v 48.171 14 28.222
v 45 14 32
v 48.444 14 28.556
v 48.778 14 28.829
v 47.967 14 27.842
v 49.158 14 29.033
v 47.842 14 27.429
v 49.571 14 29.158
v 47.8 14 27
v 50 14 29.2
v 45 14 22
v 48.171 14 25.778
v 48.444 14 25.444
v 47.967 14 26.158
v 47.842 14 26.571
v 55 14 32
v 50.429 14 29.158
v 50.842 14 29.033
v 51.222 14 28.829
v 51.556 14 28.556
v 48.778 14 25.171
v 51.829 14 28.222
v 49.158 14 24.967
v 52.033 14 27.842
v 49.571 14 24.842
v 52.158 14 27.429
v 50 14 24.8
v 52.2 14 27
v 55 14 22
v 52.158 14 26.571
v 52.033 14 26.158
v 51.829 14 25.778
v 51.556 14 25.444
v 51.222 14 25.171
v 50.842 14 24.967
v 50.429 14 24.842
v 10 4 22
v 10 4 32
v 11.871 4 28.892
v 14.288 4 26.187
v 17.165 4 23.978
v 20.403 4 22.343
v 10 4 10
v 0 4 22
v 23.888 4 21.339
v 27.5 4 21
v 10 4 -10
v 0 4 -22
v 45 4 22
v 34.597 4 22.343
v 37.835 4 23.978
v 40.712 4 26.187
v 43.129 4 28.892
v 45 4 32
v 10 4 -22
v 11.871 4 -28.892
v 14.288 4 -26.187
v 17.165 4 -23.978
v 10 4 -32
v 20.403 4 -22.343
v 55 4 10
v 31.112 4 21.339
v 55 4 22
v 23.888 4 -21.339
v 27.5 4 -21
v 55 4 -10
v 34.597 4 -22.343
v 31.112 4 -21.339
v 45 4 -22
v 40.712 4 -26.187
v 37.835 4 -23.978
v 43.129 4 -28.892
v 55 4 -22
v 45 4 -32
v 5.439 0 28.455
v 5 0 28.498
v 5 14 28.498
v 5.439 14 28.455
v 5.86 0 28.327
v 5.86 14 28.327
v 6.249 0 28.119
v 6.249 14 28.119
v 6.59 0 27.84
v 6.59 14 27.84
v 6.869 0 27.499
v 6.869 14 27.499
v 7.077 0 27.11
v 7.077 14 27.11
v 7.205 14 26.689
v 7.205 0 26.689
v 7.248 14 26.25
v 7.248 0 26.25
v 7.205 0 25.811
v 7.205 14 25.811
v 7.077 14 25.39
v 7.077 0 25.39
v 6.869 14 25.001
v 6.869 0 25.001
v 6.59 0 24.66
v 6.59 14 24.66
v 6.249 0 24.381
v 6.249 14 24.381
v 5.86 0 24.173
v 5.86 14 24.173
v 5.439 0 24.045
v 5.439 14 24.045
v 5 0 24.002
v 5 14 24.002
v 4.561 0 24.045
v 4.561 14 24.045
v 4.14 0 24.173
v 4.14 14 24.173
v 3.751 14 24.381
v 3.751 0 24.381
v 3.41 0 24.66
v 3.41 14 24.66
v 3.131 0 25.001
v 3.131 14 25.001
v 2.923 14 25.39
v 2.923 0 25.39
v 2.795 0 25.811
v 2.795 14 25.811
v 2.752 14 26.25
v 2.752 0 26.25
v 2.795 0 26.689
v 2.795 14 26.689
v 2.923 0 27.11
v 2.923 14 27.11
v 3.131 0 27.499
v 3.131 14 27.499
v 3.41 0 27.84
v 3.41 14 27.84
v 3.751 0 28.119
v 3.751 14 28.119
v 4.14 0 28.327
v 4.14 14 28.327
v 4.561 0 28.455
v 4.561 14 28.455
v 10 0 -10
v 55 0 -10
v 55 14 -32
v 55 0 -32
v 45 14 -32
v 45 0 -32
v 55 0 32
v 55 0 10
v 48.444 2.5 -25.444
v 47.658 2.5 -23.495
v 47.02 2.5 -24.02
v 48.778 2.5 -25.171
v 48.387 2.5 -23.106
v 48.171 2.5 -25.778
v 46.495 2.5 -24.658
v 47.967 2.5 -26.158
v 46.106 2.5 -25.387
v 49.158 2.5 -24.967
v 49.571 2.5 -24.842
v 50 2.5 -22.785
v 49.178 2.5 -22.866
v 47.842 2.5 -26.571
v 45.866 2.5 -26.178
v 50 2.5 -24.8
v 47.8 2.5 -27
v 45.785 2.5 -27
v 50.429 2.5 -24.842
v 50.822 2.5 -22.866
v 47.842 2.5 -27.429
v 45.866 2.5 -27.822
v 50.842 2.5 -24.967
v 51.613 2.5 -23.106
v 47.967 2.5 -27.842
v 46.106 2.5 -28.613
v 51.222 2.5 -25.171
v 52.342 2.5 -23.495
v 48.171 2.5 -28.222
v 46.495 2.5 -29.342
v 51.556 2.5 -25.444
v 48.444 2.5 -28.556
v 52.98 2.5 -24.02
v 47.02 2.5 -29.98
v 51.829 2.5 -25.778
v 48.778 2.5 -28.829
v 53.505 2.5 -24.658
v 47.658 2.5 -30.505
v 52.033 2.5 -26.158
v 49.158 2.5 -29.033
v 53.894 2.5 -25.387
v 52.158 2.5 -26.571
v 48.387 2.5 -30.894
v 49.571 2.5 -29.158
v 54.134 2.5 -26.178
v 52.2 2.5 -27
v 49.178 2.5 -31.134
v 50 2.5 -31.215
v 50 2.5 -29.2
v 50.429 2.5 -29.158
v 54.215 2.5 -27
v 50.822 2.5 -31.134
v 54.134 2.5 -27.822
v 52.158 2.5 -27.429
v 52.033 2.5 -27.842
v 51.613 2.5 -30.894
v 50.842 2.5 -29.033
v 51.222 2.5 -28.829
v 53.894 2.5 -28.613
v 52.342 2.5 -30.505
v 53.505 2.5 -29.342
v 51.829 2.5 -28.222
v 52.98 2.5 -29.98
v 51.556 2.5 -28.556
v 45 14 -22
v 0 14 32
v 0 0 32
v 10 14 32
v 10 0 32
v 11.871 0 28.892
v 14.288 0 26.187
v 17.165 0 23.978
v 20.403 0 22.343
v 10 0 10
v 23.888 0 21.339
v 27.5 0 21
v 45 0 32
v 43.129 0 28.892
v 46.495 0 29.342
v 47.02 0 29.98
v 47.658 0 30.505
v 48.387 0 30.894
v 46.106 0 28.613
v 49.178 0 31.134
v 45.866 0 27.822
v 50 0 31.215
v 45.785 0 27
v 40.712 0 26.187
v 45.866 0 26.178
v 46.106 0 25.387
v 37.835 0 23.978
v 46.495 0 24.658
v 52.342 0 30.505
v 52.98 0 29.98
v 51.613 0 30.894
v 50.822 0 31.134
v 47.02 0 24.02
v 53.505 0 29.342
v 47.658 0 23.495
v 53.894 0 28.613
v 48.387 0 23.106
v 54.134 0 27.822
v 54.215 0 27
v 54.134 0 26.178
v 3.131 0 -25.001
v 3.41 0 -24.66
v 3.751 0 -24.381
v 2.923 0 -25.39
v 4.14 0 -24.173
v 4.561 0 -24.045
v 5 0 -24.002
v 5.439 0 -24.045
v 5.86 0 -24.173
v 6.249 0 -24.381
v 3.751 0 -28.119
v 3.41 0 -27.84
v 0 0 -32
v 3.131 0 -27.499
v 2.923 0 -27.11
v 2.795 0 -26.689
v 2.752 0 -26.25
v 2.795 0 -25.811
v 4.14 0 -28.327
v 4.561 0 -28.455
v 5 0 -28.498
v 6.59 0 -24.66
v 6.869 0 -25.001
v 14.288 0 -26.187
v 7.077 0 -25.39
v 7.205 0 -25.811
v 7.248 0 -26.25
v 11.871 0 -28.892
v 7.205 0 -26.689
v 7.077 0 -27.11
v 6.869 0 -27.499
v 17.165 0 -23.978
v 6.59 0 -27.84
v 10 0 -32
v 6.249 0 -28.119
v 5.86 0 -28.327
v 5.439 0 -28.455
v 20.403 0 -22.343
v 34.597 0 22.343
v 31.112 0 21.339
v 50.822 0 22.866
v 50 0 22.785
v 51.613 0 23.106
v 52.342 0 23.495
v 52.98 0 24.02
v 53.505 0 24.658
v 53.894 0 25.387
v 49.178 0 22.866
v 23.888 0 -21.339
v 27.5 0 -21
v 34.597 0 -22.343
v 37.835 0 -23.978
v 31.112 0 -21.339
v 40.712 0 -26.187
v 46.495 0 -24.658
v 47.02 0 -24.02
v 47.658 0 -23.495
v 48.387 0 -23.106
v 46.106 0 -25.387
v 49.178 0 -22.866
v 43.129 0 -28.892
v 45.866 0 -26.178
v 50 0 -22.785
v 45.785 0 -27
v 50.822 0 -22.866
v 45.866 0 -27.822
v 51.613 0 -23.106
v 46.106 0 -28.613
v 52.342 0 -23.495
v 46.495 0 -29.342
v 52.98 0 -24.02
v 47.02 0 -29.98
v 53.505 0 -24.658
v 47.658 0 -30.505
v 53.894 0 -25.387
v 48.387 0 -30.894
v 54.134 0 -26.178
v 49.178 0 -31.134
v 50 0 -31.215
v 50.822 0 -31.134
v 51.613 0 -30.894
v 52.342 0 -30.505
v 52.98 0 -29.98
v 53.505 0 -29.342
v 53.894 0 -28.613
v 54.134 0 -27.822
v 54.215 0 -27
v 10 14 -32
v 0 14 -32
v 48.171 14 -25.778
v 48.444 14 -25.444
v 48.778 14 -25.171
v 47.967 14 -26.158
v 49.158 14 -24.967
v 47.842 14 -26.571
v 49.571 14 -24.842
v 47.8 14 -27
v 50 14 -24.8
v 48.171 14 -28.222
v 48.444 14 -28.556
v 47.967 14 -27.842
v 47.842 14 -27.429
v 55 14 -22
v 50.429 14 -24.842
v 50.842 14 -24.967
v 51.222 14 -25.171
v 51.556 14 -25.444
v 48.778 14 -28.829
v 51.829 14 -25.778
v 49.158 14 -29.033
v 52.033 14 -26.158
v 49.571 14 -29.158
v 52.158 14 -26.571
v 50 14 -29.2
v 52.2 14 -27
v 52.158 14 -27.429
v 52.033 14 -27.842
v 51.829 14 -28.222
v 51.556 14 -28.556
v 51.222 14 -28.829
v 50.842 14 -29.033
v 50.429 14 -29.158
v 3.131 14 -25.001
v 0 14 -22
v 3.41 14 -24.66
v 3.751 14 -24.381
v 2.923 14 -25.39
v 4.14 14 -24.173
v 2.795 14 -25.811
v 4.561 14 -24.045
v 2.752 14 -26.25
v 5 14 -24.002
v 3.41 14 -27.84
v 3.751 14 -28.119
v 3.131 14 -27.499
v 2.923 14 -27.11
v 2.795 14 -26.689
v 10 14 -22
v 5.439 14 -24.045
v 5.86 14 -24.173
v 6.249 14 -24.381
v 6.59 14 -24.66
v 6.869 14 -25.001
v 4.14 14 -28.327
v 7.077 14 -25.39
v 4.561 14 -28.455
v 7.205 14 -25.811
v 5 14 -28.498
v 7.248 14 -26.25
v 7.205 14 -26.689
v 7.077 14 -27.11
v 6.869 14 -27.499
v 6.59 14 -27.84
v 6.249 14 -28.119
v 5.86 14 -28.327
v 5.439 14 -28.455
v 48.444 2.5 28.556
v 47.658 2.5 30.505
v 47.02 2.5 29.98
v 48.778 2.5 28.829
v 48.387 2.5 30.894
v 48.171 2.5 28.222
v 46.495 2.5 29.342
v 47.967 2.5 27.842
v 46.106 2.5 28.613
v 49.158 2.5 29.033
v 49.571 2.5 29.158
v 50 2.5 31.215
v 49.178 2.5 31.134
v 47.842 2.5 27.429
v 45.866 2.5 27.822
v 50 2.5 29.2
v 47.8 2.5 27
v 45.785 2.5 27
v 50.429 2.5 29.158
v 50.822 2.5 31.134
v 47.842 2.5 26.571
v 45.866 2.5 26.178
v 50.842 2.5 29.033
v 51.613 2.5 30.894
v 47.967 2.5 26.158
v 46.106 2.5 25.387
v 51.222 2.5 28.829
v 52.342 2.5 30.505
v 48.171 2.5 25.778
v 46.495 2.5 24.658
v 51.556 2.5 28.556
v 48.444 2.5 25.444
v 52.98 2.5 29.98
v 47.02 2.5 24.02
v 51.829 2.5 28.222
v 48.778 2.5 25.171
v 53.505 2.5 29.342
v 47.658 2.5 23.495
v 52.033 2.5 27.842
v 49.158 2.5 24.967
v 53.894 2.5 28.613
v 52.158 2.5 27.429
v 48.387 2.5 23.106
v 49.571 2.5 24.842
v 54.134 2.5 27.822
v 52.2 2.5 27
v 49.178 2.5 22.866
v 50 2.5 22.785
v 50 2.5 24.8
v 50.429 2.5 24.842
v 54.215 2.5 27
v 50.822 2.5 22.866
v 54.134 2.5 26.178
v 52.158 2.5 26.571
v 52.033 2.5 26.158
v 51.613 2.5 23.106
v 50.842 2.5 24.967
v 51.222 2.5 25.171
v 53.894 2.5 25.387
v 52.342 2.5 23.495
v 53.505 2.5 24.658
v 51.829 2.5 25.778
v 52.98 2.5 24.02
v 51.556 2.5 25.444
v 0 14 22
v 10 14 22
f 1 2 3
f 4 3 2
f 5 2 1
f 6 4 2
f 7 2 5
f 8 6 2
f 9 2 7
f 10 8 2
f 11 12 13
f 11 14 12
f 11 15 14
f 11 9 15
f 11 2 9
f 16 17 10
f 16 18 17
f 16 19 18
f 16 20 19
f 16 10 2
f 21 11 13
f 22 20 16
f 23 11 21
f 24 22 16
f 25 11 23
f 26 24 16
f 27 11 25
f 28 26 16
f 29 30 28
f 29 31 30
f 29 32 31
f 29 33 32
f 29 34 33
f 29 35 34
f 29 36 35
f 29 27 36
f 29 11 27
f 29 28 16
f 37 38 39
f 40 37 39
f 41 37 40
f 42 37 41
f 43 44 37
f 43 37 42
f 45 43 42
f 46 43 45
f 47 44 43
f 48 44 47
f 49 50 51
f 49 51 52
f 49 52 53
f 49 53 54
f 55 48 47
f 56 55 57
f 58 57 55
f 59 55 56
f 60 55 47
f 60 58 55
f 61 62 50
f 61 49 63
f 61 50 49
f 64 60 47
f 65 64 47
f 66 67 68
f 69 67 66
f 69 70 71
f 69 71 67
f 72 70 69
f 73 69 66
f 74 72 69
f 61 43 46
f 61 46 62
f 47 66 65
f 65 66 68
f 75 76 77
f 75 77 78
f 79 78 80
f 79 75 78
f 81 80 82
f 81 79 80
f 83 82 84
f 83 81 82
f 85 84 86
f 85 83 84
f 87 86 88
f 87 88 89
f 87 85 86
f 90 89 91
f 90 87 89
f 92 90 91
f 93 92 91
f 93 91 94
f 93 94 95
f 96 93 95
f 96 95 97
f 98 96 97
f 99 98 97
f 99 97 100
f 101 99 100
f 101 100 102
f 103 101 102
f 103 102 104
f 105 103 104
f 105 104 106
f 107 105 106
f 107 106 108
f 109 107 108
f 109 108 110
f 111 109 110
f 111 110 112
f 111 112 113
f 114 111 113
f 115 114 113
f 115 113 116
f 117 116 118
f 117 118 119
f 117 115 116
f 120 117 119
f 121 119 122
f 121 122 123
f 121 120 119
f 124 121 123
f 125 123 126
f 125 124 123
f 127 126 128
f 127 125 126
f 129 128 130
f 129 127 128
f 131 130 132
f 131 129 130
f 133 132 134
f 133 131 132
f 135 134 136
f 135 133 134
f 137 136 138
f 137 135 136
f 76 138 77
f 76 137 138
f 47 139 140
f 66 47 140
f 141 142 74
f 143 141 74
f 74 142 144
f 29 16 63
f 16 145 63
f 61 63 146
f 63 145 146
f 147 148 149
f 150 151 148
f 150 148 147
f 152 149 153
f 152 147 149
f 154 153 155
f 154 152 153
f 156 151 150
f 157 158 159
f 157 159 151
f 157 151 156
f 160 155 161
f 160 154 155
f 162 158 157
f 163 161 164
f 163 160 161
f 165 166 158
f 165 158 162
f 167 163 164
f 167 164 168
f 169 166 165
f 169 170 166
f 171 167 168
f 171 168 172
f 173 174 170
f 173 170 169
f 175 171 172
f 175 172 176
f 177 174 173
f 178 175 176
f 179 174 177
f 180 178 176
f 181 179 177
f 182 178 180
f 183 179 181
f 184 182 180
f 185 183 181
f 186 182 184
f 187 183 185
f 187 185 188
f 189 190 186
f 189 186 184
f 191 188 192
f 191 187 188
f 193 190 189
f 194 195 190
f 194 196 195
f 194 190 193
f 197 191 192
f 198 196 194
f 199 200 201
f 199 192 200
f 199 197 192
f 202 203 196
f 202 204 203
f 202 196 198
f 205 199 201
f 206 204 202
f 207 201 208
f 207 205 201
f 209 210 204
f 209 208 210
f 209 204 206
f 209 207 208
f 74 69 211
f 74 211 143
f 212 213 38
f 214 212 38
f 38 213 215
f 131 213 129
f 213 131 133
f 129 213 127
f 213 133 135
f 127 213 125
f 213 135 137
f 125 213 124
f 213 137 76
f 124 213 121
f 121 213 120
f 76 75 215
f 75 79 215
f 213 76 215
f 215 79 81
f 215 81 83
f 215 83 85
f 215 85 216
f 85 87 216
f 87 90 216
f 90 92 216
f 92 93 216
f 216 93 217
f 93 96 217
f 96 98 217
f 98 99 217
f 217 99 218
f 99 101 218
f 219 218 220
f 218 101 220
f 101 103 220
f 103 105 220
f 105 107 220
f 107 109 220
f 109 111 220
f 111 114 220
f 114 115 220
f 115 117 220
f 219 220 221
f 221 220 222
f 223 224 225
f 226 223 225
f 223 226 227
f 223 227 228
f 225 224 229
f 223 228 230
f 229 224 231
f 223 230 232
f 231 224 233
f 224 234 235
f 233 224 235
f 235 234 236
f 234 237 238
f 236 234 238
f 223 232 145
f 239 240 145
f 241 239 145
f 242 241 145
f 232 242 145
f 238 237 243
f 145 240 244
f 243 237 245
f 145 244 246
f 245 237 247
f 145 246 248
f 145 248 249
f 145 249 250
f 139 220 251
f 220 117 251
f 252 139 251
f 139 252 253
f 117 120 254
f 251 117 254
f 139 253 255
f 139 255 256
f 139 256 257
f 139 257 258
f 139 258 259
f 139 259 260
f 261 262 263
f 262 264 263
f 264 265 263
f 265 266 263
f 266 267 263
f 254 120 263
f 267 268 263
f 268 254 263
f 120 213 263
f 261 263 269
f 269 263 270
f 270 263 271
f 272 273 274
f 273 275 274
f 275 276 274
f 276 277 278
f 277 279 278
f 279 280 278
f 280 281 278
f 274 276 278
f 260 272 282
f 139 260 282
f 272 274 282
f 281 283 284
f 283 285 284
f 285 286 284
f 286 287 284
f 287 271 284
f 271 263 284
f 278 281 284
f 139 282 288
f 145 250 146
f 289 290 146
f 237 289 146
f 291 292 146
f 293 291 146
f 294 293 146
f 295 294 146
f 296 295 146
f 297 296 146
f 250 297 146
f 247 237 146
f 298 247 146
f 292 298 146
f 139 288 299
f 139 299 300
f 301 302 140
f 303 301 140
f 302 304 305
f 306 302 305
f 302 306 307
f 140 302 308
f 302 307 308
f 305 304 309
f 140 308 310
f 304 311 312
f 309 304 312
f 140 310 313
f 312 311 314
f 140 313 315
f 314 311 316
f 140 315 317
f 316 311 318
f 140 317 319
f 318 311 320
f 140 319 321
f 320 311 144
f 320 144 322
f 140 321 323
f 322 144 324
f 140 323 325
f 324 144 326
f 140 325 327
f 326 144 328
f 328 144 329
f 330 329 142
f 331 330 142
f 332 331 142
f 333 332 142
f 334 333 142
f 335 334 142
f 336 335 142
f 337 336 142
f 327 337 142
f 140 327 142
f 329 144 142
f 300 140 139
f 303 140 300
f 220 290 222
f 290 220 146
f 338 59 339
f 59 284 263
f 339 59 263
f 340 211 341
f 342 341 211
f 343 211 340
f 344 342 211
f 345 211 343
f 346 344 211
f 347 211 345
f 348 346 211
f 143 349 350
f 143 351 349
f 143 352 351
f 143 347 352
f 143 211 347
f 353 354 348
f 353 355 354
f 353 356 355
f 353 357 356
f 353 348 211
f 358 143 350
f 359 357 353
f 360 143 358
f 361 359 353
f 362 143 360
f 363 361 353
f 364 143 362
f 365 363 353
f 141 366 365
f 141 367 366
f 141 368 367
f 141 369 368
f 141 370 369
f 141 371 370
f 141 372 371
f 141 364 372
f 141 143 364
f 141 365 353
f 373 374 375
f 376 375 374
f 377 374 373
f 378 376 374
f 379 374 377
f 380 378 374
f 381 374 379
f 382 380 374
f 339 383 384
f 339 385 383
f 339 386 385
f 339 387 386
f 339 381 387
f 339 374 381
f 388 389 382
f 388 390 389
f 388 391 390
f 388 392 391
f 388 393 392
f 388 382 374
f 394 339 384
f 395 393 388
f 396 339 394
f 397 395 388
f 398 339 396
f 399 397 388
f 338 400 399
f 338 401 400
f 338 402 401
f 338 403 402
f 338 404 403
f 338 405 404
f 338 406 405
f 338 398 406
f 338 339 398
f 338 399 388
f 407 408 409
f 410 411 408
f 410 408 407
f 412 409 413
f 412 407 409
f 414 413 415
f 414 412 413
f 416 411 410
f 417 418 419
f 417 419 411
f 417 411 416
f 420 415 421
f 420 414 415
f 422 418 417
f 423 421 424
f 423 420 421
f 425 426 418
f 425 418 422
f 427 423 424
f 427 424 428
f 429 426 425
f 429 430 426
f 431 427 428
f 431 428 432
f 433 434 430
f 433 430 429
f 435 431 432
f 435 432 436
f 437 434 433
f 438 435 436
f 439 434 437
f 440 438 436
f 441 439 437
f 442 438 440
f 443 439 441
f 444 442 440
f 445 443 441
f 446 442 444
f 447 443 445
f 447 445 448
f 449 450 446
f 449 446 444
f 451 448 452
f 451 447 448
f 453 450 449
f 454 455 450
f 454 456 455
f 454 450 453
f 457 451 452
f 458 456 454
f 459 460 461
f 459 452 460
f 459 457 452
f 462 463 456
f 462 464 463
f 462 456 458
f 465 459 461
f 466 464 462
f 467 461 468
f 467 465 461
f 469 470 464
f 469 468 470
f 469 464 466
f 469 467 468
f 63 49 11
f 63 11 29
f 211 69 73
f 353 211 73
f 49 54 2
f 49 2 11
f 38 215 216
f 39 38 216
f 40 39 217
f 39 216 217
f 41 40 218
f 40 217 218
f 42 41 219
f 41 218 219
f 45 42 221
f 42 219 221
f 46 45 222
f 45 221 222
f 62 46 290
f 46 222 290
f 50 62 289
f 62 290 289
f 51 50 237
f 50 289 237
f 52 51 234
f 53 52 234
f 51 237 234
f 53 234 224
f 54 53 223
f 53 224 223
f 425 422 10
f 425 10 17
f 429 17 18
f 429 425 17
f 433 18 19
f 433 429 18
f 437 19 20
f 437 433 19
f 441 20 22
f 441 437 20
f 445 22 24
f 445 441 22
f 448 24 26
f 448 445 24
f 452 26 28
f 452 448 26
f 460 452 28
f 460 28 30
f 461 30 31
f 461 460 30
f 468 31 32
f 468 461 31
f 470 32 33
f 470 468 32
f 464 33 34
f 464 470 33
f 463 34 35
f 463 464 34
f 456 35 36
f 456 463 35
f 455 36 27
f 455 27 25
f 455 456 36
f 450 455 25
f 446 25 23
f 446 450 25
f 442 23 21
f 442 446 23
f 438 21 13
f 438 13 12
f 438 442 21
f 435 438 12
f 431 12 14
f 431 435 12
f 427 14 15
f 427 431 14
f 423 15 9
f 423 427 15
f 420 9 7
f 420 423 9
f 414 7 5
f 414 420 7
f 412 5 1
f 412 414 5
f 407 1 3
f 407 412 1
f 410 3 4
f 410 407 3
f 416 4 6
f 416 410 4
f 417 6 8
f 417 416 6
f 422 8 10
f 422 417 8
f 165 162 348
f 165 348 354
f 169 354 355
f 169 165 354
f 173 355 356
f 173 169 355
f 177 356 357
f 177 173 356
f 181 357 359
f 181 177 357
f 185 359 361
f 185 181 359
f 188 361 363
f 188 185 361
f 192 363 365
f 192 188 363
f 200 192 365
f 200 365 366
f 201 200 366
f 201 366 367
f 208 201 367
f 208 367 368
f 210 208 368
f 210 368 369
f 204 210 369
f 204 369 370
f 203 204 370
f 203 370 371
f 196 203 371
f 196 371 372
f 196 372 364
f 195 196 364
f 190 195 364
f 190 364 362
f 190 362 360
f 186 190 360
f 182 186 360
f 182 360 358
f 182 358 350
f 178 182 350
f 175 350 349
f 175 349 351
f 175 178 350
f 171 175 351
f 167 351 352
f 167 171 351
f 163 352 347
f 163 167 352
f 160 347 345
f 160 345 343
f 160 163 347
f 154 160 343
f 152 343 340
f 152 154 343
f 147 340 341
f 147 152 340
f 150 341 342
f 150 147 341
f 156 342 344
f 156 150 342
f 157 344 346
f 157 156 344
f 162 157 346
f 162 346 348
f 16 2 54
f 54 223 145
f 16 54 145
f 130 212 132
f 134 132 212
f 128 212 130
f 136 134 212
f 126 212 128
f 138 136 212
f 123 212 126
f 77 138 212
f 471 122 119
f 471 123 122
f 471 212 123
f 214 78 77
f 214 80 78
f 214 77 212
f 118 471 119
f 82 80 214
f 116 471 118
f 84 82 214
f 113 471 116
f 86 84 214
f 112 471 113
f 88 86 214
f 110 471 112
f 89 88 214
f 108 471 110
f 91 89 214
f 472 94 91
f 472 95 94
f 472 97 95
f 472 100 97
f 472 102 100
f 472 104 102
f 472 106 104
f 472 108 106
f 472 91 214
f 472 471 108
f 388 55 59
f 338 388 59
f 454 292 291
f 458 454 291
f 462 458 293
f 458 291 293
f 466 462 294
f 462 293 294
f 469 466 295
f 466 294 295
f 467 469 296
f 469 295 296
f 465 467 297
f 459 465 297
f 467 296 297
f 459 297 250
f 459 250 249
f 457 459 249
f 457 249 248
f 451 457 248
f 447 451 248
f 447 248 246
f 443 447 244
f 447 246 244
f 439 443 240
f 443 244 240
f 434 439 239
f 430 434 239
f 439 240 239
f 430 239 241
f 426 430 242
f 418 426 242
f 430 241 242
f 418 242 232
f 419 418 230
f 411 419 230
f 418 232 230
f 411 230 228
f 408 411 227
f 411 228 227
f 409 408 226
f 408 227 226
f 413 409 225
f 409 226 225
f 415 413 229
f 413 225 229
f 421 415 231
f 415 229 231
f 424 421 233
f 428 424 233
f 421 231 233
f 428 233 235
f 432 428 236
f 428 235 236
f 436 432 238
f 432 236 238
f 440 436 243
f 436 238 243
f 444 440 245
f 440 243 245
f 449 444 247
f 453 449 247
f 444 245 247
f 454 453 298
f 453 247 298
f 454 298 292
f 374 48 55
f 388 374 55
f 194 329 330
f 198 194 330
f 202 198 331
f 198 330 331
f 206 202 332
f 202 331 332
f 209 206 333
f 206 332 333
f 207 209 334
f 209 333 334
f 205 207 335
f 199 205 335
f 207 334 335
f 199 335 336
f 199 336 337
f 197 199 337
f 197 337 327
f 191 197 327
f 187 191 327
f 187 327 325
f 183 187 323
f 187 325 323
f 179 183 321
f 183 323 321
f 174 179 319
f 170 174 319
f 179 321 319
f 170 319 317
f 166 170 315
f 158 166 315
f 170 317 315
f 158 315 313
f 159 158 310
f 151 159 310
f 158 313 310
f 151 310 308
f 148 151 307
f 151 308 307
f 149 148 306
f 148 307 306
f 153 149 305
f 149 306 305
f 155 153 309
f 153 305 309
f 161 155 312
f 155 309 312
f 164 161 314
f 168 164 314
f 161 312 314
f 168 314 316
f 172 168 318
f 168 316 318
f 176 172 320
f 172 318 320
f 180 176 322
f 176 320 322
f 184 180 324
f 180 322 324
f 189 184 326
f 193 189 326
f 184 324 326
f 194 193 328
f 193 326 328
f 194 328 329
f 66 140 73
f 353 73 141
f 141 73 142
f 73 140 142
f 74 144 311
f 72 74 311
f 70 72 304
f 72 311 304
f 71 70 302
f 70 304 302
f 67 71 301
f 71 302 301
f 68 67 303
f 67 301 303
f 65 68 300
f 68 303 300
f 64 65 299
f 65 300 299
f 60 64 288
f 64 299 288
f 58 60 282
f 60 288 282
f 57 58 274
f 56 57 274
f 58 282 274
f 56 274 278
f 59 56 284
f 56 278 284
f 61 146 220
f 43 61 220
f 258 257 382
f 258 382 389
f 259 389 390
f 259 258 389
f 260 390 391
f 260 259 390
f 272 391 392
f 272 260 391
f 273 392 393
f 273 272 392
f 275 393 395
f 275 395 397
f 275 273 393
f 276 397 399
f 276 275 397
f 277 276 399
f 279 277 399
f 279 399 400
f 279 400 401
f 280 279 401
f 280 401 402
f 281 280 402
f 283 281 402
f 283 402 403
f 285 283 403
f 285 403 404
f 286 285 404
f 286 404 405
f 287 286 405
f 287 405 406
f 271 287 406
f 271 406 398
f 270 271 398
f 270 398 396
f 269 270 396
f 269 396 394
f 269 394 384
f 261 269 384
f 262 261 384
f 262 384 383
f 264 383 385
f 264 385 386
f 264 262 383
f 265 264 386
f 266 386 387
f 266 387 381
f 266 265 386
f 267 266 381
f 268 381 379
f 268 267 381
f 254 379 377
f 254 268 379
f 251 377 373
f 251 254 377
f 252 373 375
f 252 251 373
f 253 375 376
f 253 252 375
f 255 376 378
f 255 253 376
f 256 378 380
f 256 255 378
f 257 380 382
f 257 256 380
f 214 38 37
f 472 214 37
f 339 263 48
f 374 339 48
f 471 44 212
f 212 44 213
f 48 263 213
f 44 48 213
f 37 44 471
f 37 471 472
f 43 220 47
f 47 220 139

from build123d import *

# Parameters (mm, degrees)
SKETCH1_R                  = 2.2
SKETCH1_R_2                = 2.2479
EXTRUDE_BODY_DEPTH         = 4
SKETCH5_W                  = 10
SKETCH5_H                  = 10
SKETCH5_R                  = 2.2
SKETCH5_R_2                = 2.2479
EXTRUDE_LEGS_DEPTH         = 10
SKETCH6_R                  = 4.215
CUT_BOLT_HEAD_INSETS_DEPTH = 2.5


with BuildPart() as part:
    # Sketch1 → Extrude-Body (new body)
    with BuildSketch(Plane(origin=(0, 0, 0), x_dir=(1, 0, 0), z_dir=(0, 1, 0))):
        with BuildLine():
            Line((10, -10), (10, 10))
            Line((10, 10), (55, 10))
            Line((55, 10), (55, 32))
            Line((55, 32), (45, 32))
            ThreePointArc((45, 32), (27.5, 21), (10, 32))
            Line((10, 32), (0, 32))
            Line((0, 32), (0, -32))
            Line((0, -32), (10, -32))
            ThreePointArc((10, -32), (27.5, -21), (45, -32))
            Line((45, -32), (55, -32))
            Line((55, -32), (55, -10))
            Line((55, -10), (10, -10))
        make_face()
        with Locations(Location((50, 27, 0), (0, 0, 270))):
            Circle(SKETCH1_R, mode=Mode.SUBTRACT)
        with Locations(Location((50, -27, 0), (0, 0, 270))):
            Circle(SKETCH1_R, mode=Mode.SUBTRACT)
        with Locations(Location((5, 26.25, 0), (0, 0, 270))):
            Circle(SKETCH1_R_2, mode=Mode.SUBTRACT)
        with Locations(Location((5, -26.25, 0), (0, 0, 270))):
            Circle(SKETCH1_R_2, mode=Mode.SUBTRACT)
    extrude(amount=EXTRUDE_BODY_DEPTH)

    # Sketch5 → Extrude-Legs (add)
    # profile 1 of 4: a face of its own
    with BuildSketch(Plane(origin=(0, 4, 0), x_dir=(1, 0, 0), z_dir=(0, 1, 0))):
        with Locations((50, -27)):
            Rectangle(SKETCH5_W, SKETCH5_H)
        with Locations(Location((50, -27, 0), (0, 0, 270))):
            Circle(SKETCH5_R, mode=Mode.SUBTRACT)
    # profile 2 of 4: a face of its own
    with BuildSketch(Plane(origin=(0, 4, 0), x_dir=(1, 0, 0), z_dir=(0, 1, 0))):
        with Locations((50, 27)):
            Rectangle(SKETCH5_W, SKETCH5_H)
        with Locations(Location((50, 27, 0), (0, 0, 270))):
            Circle(SKETCH5_R, mode=Mode.SUBTRACT)
    # profile 3 of 4: a face of its own
    with BuildSketch(Plane(origin=(0, 4, 0), x_dir=(1, 0, 0), z_dir=(0, 1, 0))):
        with Locations((5, 27)):
            Rectangle(SKETCH5_W, SKETCH5_H)
        with Locations(Location((5, 26.25, 0), (0, 0, 270))):
            Circle(SKETCH5_R_2, mode=Mode.SUBTRACT)
    # profile 4 of 4: a face of its own
    with BuildSketch(Plane(origin=(0, 4, 0), x_dir=(1, 0, 0), z_dir=(0, 1, 0))):
        with Locations((5, -27)):
            Rectangle(SKETCH5_W, SKETCH5_H)
        with Locations(Location((5, -26.25, 0), (0, 0, 270))):
            Circle(SKETCH5_R_2, mode=Mode.SUBTRACT)
    extrude(amount=EXTRUDE_LEGS_DEPTH)

    # Sketch6 → Cut-Bolt Head Insets (cut)
    with BuildSketch(Plane.XZ):
        with Locations(Location((50, 27, 0), (0, 0, 270))):
            Circle(SKETCH6_R)
        with Locations(Location((50, -27, 0), (0, 0, 270))):
            Circle(SKETCH6_R)
    extrude(amount=-CUT_BOLT_HEAD_INSETS_DEPTH, mode=Mode.SUBTRACT)


solid = part.part
